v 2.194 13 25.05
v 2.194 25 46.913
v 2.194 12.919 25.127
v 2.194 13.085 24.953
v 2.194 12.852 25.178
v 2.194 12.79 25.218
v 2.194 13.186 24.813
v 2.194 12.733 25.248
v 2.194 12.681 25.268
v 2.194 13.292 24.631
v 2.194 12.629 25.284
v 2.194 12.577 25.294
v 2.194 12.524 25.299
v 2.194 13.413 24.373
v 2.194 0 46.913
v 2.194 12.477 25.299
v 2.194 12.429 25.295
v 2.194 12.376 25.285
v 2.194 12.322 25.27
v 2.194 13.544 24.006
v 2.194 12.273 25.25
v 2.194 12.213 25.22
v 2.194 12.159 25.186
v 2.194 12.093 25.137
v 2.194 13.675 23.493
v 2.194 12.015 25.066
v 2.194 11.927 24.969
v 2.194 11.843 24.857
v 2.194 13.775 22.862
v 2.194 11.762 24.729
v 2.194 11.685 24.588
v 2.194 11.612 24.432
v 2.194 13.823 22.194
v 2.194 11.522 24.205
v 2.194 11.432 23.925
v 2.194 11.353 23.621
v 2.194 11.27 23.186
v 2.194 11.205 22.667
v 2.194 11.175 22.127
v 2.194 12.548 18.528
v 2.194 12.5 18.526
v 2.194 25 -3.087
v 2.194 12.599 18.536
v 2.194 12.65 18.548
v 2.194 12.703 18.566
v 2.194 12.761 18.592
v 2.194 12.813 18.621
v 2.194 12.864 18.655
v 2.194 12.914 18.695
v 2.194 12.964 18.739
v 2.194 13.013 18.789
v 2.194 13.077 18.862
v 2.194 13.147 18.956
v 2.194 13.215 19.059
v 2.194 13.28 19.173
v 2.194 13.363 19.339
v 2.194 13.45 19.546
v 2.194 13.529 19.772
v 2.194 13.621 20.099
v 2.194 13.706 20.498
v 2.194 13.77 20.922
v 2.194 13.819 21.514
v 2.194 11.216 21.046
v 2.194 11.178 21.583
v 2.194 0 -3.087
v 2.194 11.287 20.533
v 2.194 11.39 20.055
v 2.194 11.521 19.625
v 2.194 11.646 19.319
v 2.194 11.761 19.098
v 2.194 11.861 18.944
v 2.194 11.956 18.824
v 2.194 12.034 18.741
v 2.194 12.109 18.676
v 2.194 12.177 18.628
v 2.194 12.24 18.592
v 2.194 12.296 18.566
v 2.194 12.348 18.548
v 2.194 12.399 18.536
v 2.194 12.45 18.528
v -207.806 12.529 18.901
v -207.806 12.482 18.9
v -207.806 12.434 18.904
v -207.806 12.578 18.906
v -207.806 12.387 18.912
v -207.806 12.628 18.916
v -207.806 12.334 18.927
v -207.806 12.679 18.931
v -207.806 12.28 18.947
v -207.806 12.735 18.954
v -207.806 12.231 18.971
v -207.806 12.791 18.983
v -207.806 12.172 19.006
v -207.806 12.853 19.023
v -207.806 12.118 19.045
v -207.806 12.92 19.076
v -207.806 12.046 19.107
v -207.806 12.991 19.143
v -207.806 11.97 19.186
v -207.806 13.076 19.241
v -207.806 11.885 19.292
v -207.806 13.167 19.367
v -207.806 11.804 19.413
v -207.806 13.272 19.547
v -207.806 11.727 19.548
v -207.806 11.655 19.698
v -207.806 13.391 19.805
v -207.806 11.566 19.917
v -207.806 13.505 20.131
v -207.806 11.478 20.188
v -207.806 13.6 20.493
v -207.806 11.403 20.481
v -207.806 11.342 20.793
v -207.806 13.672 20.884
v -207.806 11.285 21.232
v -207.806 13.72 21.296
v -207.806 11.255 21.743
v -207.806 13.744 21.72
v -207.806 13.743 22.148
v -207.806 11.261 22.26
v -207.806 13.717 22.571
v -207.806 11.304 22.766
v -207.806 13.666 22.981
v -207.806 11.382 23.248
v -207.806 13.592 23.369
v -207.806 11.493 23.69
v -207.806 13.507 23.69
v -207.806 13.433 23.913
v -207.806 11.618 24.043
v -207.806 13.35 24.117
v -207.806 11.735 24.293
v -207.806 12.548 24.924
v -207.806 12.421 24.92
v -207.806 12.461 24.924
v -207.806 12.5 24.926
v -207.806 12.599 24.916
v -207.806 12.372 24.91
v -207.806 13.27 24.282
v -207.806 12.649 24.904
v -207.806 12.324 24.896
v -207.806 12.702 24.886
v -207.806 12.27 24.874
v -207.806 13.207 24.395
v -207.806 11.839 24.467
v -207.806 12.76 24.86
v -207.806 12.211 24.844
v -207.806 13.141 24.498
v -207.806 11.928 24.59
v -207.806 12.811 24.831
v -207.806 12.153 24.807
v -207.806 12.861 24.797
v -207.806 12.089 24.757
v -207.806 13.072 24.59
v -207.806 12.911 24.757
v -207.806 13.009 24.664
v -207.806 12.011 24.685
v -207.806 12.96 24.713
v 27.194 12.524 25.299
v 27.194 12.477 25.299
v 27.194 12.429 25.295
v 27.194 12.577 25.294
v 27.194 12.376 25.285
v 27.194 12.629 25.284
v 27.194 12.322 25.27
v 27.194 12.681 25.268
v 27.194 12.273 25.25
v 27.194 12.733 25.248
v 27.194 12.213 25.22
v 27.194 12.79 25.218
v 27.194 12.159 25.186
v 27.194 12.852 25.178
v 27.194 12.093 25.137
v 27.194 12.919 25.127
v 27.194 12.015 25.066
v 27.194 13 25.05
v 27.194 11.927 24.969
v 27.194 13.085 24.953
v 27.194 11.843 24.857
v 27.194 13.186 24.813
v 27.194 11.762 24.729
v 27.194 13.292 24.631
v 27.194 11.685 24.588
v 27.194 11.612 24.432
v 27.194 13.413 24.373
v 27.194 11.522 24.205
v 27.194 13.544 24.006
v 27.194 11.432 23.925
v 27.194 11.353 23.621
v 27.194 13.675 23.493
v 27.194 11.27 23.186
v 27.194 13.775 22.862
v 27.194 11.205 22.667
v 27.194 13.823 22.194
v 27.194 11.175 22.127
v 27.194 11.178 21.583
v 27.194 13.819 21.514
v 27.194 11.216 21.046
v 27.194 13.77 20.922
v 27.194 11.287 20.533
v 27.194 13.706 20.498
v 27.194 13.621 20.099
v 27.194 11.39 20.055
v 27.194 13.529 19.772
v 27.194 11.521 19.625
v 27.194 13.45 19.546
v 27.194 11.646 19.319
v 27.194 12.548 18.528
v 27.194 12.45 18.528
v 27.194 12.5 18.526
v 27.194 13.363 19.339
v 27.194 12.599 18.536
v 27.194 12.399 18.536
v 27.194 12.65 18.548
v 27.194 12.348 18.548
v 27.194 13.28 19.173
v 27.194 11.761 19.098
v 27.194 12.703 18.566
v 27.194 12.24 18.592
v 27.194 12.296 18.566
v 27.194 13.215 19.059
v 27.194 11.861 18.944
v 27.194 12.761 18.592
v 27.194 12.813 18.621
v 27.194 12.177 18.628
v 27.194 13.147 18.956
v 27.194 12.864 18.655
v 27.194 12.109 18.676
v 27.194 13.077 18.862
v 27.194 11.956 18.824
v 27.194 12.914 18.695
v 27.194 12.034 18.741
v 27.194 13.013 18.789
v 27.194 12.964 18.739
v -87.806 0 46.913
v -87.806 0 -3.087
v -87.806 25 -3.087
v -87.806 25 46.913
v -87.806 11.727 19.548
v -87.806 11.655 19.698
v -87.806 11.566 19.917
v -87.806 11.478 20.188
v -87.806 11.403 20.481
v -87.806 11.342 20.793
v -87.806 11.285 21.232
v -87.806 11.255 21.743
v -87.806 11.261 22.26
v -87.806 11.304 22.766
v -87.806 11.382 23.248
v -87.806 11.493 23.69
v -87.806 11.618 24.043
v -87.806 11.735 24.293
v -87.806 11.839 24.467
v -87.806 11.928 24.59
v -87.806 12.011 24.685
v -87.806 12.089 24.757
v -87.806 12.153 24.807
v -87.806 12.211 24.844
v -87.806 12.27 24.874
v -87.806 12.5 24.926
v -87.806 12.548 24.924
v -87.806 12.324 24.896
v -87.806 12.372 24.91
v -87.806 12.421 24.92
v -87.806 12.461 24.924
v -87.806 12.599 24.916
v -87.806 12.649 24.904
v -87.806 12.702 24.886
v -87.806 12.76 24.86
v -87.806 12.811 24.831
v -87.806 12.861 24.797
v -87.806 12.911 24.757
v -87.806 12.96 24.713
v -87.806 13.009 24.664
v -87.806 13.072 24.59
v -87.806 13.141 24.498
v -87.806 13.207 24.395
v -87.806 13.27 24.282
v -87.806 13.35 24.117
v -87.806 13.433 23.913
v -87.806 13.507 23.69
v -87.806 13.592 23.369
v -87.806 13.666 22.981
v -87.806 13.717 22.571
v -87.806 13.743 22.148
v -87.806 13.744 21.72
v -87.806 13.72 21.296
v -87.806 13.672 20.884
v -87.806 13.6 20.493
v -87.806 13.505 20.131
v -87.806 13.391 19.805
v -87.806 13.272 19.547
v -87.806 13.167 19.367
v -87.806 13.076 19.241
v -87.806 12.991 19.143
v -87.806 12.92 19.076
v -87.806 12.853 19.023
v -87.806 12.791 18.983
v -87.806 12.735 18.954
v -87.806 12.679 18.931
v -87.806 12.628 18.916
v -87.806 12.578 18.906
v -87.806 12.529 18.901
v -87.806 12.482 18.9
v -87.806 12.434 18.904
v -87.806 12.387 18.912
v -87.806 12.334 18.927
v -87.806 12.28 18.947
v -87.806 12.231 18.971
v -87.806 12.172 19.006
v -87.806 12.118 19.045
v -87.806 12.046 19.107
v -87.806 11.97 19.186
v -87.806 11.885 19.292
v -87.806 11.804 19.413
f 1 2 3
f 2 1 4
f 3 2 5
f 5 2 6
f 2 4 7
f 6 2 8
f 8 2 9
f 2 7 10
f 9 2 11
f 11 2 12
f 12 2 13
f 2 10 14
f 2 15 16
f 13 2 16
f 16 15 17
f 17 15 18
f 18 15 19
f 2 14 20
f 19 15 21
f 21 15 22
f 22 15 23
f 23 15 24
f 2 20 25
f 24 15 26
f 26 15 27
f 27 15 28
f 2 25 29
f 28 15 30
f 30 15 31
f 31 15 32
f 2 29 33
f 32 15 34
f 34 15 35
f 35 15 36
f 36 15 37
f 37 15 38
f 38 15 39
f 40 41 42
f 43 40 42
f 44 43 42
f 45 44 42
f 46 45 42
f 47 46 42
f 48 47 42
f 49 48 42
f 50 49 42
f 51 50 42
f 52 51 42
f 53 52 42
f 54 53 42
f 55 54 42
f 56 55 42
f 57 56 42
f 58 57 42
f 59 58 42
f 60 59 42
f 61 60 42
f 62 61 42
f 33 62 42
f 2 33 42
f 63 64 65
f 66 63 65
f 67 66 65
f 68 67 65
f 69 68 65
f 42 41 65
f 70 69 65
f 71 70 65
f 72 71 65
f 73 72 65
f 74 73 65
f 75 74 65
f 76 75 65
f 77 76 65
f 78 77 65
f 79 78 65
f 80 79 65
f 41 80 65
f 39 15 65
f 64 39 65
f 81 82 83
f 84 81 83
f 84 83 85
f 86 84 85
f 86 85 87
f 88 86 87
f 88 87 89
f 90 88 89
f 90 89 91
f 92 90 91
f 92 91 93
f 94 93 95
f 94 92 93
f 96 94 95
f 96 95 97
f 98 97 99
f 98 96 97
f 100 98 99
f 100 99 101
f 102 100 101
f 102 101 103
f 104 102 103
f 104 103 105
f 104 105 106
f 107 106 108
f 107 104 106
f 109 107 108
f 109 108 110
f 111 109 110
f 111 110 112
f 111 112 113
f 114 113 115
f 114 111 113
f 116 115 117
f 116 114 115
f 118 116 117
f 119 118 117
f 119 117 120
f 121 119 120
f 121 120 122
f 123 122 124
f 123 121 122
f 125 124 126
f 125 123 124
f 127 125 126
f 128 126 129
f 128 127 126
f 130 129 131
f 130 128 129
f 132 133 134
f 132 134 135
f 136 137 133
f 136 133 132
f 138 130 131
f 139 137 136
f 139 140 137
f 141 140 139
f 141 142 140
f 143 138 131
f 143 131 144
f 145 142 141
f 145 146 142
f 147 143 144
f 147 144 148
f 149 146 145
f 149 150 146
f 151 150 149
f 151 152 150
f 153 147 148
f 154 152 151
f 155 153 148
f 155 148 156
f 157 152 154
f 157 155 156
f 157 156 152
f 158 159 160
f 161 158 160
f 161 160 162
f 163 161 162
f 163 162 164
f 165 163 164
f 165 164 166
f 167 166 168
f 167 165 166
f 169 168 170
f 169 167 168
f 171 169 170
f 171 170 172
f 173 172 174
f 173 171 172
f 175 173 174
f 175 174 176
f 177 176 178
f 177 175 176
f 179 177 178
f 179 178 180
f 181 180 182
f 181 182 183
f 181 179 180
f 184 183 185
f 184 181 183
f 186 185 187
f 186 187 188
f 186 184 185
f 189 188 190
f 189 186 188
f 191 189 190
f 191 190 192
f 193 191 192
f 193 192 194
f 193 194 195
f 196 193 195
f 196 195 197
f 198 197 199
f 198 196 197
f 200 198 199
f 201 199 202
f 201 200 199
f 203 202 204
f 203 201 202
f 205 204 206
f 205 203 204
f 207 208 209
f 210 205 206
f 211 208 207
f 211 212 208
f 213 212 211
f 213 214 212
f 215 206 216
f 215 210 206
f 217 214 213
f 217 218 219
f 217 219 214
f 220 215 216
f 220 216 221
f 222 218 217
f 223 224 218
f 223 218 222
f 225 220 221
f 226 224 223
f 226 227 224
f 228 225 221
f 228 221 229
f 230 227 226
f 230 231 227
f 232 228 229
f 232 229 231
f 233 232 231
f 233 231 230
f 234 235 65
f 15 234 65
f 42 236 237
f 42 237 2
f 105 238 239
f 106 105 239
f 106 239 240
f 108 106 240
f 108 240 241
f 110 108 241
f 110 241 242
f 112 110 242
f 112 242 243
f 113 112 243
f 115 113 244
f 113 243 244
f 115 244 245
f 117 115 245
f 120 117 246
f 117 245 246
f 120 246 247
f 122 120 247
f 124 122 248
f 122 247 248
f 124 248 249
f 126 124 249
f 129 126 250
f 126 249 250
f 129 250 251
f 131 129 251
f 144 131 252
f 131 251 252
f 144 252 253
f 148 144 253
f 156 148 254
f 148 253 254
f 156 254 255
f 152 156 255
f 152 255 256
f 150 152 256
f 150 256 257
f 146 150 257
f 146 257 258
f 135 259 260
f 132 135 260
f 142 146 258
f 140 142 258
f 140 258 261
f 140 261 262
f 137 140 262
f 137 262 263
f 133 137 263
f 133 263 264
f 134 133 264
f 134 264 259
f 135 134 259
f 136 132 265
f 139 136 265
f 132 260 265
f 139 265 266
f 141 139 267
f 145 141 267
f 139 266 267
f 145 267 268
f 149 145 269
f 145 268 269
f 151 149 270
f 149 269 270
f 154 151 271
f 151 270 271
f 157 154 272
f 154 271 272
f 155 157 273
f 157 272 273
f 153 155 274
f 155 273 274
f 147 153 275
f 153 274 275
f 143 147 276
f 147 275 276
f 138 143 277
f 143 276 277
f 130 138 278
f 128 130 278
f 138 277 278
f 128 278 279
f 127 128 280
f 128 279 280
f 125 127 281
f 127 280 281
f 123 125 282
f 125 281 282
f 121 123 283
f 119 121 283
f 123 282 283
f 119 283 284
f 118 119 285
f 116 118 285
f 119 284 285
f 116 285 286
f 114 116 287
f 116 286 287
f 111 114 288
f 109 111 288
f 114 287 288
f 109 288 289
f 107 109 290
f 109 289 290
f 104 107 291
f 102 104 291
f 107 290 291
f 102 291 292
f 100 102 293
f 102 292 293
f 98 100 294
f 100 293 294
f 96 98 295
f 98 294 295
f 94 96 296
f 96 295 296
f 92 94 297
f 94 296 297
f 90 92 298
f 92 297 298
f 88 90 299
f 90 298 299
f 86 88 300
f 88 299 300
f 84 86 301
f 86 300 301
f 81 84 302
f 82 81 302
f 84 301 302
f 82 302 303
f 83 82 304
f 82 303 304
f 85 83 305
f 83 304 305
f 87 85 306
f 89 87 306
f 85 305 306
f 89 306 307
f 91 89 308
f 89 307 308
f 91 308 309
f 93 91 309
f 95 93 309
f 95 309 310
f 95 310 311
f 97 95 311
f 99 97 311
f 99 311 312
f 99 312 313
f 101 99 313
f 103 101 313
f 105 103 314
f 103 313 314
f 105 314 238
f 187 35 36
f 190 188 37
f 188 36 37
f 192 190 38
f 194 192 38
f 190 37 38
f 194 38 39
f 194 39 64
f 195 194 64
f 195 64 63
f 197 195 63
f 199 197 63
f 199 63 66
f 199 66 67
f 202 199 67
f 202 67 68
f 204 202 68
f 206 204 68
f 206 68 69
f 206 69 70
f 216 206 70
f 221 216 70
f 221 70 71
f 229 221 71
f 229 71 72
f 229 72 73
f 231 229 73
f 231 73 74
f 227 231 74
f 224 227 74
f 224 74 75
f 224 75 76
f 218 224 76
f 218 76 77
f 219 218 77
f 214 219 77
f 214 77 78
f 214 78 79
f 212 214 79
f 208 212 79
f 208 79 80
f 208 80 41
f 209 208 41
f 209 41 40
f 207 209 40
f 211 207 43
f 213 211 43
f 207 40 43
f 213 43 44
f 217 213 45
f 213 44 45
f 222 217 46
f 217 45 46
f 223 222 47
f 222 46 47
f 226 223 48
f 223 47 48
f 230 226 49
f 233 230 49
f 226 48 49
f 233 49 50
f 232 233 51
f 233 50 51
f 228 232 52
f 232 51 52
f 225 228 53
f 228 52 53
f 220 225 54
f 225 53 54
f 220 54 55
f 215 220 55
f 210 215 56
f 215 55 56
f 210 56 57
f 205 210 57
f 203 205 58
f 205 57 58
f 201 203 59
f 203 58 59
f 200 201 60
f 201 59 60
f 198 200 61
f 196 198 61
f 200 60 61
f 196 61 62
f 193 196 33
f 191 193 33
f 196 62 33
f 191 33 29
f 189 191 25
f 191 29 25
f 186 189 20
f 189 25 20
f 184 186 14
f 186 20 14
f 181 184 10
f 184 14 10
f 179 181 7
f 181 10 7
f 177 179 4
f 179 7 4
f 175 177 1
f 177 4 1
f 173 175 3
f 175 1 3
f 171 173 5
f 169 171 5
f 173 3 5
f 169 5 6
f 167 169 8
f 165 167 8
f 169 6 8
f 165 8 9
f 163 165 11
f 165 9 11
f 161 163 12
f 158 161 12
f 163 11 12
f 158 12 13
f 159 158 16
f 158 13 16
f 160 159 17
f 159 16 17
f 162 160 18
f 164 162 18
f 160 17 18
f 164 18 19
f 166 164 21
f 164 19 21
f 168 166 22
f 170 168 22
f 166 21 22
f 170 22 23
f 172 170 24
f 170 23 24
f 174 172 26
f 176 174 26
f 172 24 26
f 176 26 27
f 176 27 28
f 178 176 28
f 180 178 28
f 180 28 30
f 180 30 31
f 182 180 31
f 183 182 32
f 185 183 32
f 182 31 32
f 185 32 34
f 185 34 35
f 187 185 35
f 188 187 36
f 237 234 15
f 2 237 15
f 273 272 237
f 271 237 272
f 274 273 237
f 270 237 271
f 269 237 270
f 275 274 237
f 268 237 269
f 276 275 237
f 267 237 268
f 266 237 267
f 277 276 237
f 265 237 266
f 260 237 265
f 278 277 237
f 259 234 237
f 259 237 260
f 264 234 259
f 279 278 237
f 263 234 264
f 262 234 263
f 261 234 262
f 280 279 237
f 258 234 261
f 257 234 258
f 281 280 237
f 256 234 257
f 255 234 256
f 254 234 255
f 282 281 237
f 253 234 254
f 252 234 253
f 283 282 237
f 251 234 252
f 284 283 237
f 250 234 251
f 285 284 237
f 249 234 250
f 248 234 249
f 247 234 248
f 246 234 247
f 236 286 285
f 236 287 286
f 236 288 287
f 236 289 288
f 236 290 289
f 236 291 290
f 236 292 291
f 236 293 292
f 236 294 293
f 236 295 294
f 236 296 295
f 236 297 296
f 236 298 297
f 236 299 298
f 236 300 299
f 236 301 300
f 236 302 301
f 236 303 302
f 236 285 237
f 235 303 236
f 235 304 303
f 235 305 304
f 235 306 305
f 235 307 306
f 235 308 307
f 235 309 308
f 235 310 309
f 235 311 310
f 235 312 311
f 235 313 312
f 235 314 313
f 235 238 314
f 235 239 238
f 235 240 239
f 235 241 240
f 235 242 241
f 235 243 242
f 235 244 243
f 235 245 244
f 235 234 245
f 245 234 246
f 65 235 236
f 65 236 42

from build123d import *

# Parameters (mm, degrees)
SKETCH1_W           = 90
SKETCH1_H           = 50
BOSS_EXTRUDE1_DEPTH = 25
SKETCH2_RX          = 3.012998166
SKETCH2_RY          = 1.246882068
BOSS_EXTRUDE2_DEPTH = 120
SKETCH3_RX          = 3.386952559
SKETCH3_RY          = 1.327839356
BOSS_EXTRUDE3_DEPTH = 25


with BuildPart() as part:
    # Sketch1 → Boss-Extrude1 (new body)
    with BuildSketch(Plane(origin=(0, 0, 0), x_dir=(1, 0, 0), z_dir=(0, 1, 0))):
        with Locations((-42.805614477, -21.913)):
            Rectangle(SKETCH1_W, SKETCH1_H)
    extrude(amount=BOSS_EXTRUDE1_DEPTH)

    # Sketch2 → Boss-Extrude2 (add)
    with BuildSketch(Plane.ZY.offset(87.805614477)):
        with Locations((21.913, 12.5)):
            Ellipse(SKETCH2_RX, SKETCH2_RY)
    extrude(amount=BOSS_EXTRUDE2_DEPTH)

    # Sketch3 → Boss-Extrude3 (add)
    with BuildSketch(Plane(origin=(2.194385523, 0, 0), x_dir=(0, 0, -1), z_dir=(1, 0, 0))):
        with Locations((-21.913, 12.5)):
            Ellipse(SKETCH3_RX, SKETCH3_RY)
    extrude(amount=BOSS_EXTRUDE3_DEPTH)


solid = part.part
